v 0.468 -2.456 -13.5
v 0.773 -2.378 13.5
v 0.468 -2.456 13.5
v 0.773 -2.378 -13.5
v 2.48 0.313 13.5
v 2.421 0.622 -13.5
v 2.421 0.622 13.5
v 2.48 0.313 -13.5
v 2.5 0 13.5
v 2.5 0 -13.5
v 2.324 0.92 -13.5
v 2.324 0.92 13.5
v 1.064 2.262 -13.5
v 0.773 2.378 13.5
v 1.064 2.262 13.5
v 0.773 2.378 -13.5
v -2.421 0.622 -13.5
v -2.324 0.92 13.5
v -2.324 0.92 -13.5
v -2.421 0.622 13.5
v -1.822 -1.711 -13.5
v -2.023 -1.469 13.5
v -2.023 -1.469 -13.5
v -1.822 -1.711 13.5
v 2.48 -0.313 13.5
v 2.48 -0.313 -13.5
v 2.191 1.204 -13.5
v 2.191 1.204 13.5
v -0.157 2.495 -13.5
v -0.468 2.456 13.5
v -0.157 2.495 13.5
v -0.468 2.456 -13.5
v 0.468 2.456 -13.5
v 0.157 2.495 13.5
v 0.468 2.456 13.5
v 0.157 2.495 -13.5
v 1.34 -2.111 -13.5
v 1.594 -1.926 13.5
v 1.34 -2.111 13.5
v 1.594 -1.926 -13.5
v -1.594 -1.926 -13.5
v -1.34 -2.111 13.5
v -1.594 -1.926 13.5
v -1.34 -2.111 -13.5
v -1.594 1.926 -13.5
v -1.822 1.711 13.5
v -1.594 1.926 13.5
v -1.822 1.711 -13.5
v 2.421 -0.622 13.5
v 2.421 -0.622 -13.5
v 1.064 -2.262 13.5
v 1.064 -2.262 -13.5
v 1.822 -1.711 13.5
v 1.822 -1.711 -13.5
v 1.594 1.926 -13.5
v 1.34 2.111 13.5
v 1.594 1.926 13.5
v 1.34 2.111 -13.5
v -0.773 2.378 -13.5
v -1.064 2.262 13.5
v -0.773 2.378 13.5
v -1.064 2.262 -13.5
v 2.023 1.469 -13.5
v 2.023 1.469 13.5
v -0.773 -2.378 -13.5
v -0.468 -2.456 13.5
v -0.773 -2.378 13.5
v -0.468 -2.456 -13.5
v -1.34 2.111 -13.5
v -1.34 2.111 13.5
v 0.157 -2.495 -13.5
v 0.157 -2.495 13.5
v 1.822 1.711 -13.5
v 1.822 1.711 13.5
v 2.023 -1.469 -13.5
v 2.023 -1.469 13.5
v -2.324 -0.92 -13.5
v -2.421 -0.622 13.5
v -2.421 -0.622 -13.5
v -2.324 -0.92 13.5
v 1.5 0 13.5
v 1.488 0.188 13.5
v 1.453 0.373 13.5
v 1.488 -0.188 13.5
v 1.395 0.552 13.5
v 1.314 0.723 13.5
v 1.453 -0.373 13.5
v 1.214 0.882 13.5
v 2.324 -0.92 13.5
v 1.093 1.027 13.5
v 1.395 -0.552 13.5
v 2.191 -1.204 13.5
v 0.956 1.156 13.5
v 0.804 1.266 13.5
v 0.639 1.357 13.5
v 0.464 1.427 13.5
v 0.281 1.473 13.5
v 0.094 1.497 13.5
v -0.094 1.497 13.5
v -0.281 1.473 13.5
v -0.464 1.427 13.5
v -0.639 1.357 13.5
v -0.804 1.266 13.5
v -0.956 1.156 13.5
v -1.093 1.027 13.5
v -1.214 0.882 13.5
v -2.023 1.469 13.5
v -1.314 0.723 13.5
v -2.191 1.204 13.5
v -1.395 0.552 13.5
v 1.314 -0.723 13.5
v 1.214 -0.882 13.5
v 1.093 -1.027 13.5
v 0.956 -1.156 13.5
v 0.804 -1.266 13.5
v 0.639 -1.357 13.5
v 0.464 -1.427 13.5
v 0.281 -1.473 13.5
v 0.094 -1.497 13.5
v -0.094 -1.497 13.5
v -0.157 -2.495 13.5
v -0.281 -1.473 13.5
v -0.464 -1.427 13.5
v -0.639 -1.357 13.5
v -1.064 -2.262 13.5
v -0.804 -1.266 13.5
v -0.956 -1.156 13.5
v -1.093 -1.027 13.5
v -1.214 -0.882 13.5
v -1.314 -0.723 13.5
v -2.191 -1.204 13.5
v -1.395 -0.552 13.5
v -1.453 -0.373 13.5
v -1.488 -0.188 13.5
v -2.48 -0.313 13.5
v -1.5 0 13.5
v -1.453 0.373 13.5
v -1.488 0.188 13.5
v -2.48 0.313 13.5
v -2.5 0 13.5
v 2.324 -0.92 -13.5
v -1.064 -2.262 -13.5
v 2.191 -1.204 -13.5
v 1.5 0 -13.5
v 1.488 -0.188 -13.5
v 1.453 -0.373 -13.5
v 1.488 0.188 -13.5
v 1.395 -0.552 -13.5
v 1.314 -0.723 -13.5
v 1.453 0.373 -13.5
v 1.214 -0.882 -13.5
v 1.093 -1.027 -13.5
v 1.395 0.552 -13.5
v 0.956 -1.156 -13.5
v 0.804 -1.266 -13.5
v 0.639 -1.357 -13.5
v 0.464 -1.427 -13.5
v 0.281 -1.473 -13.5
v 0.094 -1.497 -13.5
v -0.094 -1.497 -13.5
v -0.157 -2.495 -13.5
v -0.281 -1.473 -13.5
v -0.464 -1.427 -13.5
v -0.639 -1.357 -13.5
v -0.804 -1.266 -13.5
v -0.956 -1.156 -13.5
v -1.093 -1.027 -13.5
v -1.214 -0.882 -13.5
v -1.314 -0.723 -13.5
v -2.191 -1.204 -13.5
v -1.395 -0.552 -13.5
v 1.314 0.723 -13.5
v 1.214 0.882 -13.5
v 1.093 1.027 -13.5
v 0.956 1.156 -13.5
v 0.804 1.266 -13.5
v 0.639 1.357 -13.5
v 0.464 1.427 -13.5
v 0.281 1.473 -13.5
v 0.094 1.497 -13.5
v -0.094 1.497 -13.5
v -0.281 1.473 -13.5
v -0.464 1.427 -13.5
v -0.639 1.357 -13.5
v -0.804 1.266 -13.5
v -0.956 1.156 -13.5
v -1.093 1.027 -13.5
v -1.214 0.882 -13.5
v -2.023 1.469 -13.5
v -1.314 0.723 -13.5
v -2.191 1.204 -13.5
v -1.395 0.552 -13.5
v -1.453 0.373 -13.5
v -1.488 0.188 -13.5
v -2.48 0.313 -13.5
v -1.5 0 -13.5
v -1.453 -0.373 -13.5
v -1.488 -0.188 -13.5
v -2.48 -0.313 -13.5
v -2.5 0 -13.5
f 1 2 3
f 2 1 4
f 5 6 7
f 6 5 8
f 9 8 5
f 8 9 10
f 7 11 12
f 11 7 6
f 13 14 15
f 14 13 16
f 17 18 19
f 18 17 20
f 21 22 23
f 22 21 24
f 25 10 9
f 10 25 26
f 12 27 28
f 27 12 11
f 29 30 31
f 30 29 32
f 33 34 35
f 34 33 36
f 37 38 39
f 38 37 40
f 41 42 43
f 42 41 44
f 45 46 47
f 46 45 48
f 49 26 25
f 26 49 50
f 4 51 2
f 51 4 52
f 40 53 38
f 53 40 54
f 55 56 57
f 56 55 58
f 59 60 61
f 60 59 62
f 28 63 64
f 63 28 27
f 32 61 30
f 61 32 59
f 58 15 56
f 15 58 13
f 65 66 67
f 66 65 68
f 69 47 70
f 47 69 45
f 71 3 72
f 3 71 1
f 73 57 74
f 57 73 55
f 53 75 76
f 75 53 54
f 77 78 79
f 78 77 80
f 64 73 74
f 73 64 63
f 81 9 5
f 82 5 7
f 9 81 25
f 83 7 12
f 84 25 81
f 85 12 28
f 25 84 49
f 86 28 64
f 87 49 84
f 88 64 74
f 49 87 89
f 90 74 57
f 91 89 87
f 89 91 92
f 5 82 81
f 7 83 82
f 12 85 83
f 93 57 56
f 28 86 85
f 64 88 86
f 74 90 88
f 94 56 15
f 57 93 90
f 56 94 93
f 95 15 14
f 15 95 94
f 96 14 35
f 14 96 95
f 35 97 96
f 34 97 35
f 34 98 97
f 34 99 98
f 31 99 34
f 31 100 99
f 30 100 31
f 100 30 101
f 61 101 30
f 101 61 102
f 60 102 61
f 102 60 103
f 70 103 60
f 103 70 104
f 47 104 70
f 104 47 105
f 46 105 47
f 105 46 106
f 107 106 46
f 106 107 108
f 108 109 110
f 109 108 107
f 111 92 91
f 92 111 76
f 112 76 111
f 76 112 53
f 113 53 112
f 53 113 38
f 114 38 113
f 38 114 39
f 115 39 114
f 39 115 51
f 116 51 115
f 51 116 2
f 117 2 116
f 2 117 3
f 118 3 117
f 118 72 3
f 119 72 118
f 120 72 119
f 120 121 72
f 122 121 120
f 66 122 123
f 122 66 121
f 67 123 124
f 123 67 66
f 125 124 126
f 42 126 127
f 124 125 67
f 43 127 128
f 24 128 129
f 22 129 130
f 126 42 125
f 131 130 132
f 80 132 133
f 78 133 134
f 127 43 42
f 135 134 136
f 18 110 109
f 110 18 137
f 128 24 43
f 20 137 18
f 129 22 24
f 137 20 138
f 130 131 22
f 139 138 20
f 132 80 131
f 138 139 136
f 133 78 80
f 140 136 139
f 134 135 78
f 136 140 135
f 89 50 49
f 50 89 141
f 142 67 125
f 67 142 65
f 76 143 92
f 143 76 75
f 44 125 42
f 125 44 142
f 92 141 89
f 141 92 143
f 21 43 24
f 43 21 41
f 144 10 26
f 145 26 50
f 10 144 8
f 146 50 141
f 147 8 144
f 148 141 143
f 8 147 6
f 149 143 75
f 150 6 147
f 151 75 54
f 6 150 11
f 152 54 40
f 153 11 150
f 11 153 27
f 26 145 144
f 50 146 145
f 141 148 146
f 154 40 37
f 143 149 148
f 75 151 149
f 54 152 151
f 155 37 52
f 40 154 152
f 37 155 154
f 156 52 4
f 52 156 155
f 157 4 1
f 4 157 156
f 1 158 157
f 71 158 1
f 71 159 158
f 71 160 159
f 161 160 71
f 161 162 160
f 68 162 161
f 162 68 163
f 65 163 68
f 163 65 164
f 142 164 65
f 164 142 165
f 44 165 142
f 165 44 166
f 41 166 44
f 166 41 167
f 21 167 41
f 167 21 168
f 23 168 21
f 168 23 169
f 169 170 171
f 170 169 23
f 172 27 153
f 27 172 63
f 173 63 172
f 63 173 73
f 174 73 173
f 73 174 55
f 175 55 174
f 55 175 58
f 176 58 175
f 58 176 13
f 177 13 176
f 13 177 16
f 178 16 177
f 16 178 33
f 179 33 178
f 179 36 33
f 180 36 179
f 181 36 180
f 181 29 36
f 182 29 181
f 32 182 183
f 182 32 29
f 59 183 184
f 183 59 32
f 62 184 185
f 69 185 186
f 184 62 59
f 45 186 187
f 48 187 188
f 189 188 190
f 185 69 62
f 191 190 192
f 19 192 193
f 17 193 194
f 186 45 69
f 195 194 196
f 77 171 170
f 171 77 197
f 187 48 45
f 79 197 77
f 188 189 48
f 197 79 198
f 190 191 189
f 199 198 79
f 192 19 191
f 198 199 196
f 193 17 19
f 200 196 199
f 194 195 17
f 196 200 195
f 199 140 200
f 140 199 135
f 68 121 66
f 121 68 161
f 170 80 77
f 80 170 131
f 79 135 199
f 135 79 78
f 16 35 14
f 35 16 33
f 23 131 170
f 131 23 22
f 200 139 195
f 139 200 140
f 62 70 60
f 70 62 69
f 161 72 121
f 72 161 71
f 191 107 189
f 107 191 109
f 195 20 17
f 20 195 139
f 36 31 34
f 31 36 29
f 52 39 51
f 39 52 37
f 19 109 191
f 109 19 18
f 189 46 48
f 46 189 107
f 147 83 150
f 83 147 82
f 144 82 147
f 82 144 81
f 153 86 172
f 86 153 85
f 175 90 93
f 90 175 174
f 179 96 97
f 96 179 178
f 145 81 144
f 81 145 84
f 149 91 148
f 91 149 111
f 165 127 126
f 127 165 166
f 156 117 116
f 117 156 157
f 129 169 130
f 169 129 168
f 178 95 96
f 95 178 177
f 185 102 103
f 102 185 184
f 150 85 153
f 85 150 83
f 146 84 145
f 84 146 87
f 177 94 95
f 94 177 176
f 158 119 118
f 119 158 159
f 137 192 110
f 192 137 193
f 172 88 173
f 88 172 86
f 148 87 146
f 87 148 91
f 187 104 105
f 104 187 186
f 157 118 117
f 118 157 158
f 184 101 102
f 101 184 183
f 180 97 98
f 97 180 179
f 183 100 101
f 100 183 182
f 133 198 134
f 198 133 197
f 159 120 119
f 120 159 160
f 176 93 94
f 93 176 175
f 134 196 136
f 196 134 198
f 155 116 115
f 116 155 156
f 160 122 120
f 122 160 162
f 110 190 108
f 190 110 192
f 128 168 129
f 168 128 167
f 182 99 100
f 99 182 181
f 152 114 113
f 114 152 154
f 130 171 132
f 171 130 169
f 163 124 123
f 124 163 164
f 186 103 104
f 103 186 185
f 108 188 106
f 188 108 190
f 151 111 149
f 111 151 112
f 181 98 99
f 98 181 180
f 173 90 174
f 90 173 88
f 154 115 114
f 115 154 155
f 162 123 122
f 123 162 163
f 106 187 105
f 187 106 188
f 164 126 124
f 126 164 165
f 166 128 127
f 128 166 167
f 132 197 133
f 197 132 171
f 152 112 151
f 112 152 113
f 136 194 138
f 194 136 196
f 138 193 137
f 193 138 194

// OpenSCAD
$fn = 50;


difference() {
	union() {
		translate(v = [0, 0, -13.5000000000]) {
			cylinder(h = 27, r = 2.5000000000);
		}
	}
	union() {
		translate(v = [0, 0, -100.0000000000]) {
			cylinder(h = 200, r = 1.5000000000);
		}
	}
}
